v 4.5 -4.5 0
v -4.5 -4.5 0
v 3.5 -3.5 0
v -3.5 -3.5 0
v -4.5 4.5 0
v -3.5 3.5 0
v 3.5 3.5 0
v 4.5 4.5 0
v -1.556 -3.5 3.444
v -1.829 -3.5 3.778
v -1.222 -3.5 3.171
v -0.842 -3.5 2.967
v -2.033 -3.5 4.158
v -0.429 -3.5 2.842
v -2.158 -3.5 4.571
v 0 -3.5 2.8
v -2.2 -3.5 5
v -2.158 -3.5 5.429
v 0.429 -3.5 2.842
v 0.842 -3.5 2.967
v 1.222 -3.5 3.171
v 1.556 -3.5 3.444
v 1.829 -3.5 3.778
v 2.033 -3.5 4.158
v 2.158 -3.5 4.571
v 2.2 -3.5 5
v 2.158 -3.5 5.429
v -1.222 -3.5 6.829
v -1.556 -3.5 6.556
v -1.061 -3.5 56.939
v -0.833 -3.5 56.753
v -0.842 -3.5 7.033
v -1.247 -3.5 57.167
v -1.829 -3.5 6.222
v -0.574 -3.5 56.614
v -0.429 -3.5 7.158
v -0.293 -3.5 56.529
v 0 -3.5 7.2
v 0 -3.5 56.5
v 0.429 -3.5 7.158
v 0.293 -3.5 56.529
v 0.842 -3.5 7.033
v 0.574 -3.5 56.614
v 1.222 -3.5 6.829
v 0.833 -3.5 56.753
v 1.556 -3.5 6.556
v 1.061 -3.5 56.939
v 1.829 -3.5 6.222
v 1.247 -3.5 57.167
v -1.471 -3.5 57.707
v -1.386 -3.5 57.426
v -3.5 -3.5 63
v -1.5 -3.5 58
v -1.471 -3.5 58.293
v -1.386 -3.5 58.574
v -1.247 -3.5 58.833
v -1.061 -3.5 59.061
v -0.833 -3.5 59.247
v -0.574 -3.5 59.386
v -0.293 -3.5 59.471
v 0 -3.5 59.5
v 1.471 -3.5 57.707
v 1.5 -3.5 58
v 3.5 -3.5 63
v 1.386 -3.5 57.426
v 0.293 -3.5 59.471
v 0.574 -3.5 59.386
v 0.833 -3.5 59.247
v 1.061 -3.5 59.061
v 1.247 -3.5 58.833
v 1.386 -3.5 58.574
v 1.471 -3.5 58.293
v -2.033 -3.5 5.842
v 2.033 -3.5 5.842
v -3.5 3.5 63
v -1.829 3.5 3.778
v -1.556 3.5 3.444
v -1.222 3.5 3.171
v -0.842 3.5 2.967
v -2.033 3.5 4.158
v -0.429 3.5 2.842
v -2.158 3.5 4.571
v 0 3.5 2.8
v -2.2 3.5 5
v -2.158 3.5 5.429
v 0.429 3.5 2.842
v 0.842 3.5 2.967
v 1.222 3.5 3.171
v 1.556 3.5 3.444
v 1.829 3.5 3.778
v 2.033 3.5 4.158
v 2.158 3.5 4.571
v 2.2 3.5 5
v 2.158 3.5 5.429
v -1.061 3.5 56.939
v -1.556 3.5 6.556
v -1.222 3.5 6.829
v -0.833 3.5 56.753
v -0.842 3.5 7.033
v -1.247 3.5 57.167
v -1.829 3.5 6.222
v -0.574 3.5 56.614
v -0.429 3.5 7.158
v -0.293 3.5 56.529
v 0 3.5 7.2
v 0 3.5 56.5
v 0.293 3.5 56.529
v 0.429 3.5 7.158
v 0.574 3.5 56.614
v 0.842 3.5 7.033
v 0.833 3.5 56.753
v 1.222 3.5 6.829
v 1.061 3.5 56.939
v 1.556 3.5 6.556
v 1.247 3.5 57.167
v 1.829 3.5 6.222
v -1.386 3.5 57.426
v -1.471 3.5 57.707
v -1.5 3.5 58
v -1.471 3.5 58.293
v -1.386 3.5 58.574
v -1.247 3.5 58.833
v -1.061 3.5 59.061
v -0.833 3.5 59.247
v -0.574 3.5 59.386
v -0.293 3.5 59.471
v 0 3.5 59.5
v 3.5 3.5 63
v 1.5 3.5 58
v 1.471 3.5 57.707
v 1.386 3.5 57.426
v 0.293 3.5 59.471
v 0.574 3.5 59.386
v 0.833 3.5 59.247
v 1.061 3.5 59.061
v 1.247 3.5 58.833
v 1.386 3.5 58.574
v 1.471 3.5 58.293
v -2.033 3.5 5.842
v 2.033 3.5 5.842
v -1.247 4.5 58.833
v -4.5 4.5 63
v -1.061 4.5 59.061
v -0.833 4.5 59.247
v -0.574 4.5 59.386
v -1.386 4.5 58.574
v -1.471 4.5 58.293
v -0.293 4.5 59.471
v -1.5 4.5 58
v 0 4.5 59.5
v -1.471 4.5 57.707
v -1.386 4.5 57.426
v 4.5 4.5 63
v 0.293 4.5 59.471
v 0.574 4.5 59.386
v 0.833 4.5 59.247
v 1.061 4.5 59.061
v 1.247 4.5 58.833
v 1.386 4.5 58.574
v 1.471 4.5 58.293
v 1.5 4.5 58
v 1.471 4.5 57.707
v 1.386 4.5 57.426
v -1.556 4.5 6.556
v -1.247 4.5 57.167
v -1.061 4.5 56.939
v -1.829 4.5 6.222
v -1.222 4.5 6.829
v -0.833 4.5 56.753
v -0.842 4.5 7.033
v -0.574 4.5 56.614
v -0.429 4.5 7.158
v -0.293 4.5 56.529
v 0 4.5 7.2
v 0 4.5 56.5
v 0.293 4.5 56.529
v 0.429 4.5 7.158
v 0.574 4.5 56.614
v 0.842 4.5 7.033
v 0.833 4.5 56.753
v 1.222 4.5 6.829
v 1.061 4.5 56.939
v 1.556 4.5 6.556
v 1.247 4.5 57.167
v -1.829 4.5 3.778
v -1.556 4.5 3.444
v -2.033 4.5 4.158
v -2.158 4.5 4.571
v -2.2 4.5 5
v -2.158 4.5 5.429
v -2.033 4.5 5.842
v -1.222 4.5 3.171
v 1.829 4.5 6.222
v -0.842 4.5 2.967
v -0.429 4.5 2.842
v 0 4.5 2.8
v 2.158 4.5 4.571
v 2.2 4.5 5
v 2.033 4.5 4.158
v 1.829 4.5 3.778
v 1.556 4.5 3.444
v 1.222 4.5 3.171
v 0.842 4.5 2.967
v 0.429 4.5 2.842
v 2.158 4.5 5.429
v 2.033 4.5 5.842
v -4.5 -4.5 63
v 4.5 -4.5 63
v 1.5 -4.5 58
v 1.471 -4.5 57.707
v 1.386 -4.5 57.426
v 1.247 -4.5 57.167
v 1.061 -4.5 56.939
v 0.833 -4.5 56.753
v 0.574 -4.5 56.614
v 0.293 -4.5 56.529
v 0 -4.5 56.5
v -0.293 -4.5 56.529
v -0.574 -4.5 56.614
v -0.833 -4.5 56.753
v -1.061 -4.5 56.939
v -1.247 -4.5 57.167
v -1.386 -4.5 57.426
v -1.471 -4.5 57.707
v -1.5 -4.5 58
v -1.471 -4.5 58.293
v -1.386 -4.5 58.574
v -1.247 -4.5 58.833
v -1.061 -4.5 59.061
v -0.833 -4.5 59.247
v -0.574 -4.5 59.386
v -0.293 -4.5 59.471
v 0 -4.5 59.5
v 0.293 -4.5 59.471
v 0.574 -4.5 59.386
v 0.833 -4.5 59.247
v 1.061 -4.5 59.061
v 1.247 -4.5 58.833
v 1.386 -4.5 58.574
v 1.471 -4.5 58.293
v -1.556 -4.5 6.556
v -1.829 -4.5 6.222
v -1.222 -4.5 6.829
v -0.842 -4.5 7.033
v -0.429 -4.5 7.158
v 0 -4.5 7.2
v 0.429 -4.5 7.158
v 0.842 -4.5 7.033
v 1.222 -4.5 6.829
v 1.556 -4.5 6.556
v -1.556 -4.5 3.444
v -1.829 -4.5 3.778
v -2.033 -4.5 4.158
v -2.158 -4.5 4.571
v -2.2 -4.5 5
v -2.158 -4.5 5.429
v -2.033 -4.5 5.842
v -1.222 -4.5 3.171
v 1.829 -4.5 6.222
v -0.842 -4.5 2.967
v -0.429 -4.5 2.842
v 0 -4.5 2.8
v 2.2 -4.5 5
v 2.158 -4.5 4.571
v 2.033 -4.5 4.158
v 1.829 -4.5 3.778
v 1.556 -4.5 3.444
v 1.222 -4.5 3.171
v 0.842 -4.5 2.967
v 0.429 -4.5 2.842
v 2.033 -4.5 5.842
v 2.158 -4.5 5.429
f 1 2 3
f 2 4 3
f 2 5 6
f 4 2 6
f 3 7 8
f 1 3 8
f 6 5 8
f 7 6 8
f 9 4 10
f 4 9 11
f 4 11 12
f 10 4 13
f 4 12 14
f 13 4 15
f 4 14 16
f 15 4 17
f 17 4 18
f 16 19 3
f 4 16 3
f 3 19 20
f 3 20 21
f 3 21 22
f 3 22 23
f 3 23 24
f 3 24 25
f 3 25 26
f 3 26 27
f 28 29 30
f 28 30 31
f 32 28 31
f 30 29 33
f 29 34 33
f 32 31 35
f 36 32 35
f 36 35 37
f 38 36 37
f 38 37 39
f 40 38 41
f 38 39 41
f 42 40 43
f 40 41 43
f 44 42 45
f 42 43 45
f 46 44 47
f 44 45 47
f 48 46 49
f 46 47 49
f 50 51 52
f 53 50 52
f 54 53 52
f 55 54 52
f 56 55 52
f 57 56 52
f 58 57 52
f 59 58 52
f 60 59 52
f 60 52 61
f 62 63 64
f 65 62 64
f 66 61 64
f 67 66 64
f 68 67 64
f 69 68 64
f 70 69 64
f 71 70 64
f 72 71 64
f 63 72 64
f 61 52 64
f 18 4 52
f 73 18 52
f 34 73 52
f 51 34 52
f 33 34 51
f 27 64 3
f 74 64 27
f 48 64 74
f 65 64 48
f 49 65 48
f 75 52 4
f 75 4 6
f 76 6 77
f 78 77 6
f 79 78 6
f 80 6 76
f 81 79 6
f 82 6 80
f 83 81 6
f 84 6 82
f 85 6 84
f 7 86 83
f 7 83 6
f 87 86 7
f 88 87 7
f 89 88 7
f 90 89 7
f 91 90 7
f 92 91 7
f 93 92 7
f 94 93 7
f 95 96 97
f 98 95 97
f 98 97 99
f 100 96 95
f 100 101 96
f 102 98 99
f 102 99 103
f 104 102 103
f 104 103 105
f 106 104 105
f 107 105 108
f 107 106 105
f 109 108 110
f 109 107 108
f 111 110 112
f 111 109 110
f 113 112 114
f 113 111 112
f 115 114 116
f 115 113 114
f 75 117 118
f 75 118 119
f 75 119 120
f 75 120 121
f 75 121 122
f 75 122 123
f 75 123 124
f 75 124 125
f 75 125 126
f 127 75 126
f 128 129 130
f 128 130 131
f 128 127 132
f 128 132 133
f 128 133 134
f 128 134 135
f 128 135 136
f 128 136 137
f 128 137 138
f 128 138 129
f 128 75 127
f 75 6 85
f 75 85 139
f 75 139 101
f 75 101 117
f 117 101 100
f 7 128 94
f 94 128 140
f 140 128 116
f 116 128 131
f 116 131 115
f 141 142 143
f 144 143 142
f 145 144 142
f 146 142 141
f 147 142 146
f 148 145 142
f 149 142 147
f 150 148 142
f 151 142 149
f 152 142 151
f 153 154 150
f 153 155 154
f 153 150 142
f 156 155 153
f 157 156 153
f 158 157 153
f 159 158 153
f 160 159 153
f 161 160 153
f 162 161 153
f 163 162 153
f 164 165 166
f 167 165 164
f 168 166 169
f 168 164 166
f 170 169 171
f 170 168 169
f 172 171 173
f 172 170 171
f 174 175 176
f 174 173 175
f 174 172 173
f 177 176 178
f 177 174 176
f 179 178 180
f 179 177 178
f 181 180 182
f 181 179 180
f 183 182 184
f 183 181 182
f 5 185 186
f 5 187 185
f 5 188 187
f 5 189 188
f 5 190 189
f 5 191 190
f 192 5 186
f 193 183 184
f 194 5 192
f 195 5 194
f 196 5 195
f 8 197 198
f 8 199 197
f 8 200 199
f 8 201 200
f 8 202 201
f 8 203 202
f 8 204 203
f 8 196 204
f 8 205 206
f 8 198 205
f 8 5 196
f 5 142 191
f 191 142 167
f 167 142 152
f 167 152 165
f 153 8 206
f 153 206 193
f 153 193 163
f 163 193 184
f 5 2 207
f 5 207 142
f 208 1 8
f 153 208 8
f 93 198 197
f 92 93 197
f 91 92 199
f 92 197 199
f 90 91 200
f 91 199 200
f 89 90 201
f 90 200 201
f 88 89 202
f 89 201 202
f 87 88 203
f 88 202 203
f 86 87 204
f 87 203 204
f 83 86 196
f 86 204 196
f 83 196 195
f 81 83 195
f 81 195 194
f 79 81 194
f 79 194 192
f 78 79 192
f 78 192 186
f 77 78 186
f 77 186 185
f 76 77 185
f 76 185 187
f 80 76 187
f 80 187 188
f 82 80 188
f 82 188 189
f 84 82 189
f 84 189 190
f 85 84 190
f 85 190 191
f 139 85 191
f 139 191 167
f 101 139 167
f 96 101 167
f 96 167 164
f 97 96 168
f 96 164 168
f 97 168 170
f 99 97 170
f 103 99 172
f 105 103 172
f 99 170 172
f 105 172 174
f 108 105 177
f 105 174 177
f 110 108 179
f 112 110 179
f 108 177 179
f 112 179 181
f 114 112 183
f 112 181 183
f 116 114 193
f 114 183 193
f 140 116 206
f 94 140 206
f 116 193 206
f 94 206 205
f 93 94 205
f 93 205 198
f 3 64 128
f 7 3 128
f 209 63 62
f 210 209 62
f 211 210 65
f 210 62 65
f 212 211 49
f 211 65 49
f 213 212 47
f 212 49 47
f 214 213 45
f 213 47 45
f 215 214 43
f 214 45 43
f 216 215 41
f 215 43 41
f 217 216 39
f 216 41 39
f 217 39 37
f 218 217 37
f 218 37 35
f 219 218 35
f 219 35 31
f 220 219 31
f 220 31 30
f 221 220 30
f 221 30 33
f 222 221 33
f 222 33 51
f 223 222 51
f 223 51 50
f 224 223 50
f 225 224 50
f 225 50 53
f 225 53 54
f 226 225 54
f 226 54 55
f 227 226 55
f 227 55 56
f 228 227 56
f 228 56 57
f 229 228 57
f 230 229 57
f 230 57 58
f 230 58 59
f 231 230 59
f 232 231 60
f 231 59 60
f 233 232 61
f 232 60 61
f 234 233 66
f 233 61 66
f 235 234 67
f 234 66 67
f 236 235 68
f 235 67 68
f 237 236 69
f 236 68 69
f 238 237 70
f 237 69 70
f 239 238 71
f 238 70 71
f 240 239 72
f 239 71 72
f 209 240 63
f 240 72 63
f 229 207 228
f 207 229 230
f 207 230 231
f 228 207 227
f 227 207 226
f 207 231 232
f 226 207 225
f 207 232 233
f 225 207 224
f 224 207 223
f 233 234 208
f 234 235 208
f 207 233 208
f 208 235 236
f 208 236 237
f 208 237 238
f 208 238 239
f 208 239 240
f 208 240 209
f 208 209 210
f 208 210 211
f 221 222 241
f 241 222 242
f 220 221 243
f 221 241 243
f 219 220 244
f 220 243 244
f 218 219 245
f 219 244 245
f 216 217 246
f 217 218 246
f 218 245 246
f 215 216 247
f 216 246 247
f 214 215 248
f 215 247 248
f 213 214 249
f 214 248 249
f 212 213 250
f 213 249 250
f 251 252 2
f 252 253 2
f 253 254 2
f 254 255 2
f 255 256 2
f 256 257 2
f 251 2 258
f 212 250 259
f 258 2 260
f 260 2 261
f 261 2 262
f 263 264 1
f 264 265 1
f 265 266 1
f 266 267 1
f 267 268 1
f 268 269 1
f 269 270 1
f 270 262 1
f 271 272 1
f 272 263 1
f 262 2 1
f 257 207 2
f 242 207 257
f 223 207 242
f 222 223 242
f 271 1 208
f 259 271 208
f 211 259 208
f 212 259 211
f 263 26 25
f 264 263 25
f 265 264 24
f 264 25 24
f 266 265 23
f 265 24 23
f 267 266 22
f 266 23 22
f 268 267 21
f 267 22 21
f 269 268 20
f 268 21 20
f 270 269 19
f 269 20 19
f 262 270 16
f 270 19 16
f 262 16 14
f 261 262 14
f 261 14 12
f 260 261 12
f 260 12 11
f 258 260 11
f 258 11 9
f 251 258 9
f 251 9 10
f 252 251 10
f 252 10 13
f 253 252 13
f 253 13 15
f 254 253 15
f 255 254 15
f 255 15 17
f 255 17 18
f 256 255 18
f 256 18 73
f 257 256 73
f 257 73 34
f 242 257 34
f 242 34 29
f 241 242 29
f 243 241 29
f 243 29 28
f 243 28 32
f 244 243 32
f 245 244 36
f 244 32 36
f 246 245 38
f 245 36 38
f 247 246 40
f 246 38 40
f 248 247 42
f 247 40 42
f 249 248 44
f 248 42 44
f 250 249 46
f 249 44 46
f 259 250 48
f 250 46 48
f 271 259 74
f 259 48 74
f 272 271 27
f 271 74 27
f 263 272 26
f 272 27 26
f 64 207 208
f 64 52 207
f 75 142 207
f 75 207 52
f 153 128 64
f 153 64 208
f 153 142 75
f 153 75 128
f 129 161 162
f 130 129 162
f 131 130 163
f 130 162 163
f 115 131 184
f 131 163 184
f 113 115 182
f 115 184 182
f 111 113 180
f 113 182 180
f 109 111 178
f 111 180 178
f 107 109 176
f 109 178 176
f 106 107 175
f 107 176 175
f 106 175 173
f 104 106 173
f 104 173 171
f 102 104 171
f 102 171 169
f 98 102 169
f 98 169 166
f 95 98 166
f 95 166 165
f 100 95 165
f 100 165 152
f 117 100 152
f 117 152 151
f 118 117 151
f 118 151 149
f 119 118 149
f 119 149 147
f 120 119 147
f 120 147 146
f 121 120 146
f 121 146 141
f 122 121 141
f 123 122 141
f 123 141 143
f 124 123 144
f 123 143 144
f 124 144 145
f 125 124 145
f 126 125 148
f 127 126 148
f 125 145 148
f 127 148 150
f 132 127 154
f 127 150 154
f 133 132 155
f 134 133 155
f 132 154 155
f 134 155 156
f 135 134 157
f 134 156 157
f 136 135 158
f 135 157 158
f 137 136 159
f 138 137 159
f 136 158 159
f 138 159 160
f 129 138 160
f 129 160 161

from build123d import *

# Parameters (mm, degrees)
SKETCH_1_W          = 9
SKETCH_1_H          = 9
EXTRUDE_1_DEPTH     = 63
SKETCH_2_W          = 7
SKETCH_2_H          = 7
CUT_EXTRUDE_1_DEPTH = 83
SKETCH_3_R          = 2.2
SKETCH_3_R_2        = 1.5
CUT_EXTRUDE_2_DEPTH = 93


with BuildPart() as part:
    # ｽｹｯﾁ1 → ﾎﾞｽ - 押し出し1 (new body)
    with BuildSketch(Plane.XY):
        Rectangle(SKETCH_1_W, SKETCH_1_H)
    extrude(amount=EXTRUDE_1_DEPTH)

    # ｽｹｯﾁ2 → ｶｯﾄ - 押し出し1 (cut)
    with BuildSketch(Plane.XY.offset(63)):
        Rectangle(SKETCH_2_W, SKETCH_2_H)
    extrude(amount=-CUT_EXTRUDE_1_DEPTH, mode=Mode.SUBTRACT)

    # ｽｹｯﾁ3 → ｶｯﾄ - 押し出し2 (cut)
    with BuildSketch(Plane(origin=(0, 4.5, 0), x_dir=(1, 0, 0), z_dir=(0, 1, 0))):
        with Locations((0, -5)):
            Circle(SKETCH_3_R)
        with Locations((0, -58)):
            Circle(SKETCH_3_R_2)
    extrude(amount=-CUT_EXTRUDE_2_DEPTH, mode=Mode.SUBTRACT)


solid = part.part
